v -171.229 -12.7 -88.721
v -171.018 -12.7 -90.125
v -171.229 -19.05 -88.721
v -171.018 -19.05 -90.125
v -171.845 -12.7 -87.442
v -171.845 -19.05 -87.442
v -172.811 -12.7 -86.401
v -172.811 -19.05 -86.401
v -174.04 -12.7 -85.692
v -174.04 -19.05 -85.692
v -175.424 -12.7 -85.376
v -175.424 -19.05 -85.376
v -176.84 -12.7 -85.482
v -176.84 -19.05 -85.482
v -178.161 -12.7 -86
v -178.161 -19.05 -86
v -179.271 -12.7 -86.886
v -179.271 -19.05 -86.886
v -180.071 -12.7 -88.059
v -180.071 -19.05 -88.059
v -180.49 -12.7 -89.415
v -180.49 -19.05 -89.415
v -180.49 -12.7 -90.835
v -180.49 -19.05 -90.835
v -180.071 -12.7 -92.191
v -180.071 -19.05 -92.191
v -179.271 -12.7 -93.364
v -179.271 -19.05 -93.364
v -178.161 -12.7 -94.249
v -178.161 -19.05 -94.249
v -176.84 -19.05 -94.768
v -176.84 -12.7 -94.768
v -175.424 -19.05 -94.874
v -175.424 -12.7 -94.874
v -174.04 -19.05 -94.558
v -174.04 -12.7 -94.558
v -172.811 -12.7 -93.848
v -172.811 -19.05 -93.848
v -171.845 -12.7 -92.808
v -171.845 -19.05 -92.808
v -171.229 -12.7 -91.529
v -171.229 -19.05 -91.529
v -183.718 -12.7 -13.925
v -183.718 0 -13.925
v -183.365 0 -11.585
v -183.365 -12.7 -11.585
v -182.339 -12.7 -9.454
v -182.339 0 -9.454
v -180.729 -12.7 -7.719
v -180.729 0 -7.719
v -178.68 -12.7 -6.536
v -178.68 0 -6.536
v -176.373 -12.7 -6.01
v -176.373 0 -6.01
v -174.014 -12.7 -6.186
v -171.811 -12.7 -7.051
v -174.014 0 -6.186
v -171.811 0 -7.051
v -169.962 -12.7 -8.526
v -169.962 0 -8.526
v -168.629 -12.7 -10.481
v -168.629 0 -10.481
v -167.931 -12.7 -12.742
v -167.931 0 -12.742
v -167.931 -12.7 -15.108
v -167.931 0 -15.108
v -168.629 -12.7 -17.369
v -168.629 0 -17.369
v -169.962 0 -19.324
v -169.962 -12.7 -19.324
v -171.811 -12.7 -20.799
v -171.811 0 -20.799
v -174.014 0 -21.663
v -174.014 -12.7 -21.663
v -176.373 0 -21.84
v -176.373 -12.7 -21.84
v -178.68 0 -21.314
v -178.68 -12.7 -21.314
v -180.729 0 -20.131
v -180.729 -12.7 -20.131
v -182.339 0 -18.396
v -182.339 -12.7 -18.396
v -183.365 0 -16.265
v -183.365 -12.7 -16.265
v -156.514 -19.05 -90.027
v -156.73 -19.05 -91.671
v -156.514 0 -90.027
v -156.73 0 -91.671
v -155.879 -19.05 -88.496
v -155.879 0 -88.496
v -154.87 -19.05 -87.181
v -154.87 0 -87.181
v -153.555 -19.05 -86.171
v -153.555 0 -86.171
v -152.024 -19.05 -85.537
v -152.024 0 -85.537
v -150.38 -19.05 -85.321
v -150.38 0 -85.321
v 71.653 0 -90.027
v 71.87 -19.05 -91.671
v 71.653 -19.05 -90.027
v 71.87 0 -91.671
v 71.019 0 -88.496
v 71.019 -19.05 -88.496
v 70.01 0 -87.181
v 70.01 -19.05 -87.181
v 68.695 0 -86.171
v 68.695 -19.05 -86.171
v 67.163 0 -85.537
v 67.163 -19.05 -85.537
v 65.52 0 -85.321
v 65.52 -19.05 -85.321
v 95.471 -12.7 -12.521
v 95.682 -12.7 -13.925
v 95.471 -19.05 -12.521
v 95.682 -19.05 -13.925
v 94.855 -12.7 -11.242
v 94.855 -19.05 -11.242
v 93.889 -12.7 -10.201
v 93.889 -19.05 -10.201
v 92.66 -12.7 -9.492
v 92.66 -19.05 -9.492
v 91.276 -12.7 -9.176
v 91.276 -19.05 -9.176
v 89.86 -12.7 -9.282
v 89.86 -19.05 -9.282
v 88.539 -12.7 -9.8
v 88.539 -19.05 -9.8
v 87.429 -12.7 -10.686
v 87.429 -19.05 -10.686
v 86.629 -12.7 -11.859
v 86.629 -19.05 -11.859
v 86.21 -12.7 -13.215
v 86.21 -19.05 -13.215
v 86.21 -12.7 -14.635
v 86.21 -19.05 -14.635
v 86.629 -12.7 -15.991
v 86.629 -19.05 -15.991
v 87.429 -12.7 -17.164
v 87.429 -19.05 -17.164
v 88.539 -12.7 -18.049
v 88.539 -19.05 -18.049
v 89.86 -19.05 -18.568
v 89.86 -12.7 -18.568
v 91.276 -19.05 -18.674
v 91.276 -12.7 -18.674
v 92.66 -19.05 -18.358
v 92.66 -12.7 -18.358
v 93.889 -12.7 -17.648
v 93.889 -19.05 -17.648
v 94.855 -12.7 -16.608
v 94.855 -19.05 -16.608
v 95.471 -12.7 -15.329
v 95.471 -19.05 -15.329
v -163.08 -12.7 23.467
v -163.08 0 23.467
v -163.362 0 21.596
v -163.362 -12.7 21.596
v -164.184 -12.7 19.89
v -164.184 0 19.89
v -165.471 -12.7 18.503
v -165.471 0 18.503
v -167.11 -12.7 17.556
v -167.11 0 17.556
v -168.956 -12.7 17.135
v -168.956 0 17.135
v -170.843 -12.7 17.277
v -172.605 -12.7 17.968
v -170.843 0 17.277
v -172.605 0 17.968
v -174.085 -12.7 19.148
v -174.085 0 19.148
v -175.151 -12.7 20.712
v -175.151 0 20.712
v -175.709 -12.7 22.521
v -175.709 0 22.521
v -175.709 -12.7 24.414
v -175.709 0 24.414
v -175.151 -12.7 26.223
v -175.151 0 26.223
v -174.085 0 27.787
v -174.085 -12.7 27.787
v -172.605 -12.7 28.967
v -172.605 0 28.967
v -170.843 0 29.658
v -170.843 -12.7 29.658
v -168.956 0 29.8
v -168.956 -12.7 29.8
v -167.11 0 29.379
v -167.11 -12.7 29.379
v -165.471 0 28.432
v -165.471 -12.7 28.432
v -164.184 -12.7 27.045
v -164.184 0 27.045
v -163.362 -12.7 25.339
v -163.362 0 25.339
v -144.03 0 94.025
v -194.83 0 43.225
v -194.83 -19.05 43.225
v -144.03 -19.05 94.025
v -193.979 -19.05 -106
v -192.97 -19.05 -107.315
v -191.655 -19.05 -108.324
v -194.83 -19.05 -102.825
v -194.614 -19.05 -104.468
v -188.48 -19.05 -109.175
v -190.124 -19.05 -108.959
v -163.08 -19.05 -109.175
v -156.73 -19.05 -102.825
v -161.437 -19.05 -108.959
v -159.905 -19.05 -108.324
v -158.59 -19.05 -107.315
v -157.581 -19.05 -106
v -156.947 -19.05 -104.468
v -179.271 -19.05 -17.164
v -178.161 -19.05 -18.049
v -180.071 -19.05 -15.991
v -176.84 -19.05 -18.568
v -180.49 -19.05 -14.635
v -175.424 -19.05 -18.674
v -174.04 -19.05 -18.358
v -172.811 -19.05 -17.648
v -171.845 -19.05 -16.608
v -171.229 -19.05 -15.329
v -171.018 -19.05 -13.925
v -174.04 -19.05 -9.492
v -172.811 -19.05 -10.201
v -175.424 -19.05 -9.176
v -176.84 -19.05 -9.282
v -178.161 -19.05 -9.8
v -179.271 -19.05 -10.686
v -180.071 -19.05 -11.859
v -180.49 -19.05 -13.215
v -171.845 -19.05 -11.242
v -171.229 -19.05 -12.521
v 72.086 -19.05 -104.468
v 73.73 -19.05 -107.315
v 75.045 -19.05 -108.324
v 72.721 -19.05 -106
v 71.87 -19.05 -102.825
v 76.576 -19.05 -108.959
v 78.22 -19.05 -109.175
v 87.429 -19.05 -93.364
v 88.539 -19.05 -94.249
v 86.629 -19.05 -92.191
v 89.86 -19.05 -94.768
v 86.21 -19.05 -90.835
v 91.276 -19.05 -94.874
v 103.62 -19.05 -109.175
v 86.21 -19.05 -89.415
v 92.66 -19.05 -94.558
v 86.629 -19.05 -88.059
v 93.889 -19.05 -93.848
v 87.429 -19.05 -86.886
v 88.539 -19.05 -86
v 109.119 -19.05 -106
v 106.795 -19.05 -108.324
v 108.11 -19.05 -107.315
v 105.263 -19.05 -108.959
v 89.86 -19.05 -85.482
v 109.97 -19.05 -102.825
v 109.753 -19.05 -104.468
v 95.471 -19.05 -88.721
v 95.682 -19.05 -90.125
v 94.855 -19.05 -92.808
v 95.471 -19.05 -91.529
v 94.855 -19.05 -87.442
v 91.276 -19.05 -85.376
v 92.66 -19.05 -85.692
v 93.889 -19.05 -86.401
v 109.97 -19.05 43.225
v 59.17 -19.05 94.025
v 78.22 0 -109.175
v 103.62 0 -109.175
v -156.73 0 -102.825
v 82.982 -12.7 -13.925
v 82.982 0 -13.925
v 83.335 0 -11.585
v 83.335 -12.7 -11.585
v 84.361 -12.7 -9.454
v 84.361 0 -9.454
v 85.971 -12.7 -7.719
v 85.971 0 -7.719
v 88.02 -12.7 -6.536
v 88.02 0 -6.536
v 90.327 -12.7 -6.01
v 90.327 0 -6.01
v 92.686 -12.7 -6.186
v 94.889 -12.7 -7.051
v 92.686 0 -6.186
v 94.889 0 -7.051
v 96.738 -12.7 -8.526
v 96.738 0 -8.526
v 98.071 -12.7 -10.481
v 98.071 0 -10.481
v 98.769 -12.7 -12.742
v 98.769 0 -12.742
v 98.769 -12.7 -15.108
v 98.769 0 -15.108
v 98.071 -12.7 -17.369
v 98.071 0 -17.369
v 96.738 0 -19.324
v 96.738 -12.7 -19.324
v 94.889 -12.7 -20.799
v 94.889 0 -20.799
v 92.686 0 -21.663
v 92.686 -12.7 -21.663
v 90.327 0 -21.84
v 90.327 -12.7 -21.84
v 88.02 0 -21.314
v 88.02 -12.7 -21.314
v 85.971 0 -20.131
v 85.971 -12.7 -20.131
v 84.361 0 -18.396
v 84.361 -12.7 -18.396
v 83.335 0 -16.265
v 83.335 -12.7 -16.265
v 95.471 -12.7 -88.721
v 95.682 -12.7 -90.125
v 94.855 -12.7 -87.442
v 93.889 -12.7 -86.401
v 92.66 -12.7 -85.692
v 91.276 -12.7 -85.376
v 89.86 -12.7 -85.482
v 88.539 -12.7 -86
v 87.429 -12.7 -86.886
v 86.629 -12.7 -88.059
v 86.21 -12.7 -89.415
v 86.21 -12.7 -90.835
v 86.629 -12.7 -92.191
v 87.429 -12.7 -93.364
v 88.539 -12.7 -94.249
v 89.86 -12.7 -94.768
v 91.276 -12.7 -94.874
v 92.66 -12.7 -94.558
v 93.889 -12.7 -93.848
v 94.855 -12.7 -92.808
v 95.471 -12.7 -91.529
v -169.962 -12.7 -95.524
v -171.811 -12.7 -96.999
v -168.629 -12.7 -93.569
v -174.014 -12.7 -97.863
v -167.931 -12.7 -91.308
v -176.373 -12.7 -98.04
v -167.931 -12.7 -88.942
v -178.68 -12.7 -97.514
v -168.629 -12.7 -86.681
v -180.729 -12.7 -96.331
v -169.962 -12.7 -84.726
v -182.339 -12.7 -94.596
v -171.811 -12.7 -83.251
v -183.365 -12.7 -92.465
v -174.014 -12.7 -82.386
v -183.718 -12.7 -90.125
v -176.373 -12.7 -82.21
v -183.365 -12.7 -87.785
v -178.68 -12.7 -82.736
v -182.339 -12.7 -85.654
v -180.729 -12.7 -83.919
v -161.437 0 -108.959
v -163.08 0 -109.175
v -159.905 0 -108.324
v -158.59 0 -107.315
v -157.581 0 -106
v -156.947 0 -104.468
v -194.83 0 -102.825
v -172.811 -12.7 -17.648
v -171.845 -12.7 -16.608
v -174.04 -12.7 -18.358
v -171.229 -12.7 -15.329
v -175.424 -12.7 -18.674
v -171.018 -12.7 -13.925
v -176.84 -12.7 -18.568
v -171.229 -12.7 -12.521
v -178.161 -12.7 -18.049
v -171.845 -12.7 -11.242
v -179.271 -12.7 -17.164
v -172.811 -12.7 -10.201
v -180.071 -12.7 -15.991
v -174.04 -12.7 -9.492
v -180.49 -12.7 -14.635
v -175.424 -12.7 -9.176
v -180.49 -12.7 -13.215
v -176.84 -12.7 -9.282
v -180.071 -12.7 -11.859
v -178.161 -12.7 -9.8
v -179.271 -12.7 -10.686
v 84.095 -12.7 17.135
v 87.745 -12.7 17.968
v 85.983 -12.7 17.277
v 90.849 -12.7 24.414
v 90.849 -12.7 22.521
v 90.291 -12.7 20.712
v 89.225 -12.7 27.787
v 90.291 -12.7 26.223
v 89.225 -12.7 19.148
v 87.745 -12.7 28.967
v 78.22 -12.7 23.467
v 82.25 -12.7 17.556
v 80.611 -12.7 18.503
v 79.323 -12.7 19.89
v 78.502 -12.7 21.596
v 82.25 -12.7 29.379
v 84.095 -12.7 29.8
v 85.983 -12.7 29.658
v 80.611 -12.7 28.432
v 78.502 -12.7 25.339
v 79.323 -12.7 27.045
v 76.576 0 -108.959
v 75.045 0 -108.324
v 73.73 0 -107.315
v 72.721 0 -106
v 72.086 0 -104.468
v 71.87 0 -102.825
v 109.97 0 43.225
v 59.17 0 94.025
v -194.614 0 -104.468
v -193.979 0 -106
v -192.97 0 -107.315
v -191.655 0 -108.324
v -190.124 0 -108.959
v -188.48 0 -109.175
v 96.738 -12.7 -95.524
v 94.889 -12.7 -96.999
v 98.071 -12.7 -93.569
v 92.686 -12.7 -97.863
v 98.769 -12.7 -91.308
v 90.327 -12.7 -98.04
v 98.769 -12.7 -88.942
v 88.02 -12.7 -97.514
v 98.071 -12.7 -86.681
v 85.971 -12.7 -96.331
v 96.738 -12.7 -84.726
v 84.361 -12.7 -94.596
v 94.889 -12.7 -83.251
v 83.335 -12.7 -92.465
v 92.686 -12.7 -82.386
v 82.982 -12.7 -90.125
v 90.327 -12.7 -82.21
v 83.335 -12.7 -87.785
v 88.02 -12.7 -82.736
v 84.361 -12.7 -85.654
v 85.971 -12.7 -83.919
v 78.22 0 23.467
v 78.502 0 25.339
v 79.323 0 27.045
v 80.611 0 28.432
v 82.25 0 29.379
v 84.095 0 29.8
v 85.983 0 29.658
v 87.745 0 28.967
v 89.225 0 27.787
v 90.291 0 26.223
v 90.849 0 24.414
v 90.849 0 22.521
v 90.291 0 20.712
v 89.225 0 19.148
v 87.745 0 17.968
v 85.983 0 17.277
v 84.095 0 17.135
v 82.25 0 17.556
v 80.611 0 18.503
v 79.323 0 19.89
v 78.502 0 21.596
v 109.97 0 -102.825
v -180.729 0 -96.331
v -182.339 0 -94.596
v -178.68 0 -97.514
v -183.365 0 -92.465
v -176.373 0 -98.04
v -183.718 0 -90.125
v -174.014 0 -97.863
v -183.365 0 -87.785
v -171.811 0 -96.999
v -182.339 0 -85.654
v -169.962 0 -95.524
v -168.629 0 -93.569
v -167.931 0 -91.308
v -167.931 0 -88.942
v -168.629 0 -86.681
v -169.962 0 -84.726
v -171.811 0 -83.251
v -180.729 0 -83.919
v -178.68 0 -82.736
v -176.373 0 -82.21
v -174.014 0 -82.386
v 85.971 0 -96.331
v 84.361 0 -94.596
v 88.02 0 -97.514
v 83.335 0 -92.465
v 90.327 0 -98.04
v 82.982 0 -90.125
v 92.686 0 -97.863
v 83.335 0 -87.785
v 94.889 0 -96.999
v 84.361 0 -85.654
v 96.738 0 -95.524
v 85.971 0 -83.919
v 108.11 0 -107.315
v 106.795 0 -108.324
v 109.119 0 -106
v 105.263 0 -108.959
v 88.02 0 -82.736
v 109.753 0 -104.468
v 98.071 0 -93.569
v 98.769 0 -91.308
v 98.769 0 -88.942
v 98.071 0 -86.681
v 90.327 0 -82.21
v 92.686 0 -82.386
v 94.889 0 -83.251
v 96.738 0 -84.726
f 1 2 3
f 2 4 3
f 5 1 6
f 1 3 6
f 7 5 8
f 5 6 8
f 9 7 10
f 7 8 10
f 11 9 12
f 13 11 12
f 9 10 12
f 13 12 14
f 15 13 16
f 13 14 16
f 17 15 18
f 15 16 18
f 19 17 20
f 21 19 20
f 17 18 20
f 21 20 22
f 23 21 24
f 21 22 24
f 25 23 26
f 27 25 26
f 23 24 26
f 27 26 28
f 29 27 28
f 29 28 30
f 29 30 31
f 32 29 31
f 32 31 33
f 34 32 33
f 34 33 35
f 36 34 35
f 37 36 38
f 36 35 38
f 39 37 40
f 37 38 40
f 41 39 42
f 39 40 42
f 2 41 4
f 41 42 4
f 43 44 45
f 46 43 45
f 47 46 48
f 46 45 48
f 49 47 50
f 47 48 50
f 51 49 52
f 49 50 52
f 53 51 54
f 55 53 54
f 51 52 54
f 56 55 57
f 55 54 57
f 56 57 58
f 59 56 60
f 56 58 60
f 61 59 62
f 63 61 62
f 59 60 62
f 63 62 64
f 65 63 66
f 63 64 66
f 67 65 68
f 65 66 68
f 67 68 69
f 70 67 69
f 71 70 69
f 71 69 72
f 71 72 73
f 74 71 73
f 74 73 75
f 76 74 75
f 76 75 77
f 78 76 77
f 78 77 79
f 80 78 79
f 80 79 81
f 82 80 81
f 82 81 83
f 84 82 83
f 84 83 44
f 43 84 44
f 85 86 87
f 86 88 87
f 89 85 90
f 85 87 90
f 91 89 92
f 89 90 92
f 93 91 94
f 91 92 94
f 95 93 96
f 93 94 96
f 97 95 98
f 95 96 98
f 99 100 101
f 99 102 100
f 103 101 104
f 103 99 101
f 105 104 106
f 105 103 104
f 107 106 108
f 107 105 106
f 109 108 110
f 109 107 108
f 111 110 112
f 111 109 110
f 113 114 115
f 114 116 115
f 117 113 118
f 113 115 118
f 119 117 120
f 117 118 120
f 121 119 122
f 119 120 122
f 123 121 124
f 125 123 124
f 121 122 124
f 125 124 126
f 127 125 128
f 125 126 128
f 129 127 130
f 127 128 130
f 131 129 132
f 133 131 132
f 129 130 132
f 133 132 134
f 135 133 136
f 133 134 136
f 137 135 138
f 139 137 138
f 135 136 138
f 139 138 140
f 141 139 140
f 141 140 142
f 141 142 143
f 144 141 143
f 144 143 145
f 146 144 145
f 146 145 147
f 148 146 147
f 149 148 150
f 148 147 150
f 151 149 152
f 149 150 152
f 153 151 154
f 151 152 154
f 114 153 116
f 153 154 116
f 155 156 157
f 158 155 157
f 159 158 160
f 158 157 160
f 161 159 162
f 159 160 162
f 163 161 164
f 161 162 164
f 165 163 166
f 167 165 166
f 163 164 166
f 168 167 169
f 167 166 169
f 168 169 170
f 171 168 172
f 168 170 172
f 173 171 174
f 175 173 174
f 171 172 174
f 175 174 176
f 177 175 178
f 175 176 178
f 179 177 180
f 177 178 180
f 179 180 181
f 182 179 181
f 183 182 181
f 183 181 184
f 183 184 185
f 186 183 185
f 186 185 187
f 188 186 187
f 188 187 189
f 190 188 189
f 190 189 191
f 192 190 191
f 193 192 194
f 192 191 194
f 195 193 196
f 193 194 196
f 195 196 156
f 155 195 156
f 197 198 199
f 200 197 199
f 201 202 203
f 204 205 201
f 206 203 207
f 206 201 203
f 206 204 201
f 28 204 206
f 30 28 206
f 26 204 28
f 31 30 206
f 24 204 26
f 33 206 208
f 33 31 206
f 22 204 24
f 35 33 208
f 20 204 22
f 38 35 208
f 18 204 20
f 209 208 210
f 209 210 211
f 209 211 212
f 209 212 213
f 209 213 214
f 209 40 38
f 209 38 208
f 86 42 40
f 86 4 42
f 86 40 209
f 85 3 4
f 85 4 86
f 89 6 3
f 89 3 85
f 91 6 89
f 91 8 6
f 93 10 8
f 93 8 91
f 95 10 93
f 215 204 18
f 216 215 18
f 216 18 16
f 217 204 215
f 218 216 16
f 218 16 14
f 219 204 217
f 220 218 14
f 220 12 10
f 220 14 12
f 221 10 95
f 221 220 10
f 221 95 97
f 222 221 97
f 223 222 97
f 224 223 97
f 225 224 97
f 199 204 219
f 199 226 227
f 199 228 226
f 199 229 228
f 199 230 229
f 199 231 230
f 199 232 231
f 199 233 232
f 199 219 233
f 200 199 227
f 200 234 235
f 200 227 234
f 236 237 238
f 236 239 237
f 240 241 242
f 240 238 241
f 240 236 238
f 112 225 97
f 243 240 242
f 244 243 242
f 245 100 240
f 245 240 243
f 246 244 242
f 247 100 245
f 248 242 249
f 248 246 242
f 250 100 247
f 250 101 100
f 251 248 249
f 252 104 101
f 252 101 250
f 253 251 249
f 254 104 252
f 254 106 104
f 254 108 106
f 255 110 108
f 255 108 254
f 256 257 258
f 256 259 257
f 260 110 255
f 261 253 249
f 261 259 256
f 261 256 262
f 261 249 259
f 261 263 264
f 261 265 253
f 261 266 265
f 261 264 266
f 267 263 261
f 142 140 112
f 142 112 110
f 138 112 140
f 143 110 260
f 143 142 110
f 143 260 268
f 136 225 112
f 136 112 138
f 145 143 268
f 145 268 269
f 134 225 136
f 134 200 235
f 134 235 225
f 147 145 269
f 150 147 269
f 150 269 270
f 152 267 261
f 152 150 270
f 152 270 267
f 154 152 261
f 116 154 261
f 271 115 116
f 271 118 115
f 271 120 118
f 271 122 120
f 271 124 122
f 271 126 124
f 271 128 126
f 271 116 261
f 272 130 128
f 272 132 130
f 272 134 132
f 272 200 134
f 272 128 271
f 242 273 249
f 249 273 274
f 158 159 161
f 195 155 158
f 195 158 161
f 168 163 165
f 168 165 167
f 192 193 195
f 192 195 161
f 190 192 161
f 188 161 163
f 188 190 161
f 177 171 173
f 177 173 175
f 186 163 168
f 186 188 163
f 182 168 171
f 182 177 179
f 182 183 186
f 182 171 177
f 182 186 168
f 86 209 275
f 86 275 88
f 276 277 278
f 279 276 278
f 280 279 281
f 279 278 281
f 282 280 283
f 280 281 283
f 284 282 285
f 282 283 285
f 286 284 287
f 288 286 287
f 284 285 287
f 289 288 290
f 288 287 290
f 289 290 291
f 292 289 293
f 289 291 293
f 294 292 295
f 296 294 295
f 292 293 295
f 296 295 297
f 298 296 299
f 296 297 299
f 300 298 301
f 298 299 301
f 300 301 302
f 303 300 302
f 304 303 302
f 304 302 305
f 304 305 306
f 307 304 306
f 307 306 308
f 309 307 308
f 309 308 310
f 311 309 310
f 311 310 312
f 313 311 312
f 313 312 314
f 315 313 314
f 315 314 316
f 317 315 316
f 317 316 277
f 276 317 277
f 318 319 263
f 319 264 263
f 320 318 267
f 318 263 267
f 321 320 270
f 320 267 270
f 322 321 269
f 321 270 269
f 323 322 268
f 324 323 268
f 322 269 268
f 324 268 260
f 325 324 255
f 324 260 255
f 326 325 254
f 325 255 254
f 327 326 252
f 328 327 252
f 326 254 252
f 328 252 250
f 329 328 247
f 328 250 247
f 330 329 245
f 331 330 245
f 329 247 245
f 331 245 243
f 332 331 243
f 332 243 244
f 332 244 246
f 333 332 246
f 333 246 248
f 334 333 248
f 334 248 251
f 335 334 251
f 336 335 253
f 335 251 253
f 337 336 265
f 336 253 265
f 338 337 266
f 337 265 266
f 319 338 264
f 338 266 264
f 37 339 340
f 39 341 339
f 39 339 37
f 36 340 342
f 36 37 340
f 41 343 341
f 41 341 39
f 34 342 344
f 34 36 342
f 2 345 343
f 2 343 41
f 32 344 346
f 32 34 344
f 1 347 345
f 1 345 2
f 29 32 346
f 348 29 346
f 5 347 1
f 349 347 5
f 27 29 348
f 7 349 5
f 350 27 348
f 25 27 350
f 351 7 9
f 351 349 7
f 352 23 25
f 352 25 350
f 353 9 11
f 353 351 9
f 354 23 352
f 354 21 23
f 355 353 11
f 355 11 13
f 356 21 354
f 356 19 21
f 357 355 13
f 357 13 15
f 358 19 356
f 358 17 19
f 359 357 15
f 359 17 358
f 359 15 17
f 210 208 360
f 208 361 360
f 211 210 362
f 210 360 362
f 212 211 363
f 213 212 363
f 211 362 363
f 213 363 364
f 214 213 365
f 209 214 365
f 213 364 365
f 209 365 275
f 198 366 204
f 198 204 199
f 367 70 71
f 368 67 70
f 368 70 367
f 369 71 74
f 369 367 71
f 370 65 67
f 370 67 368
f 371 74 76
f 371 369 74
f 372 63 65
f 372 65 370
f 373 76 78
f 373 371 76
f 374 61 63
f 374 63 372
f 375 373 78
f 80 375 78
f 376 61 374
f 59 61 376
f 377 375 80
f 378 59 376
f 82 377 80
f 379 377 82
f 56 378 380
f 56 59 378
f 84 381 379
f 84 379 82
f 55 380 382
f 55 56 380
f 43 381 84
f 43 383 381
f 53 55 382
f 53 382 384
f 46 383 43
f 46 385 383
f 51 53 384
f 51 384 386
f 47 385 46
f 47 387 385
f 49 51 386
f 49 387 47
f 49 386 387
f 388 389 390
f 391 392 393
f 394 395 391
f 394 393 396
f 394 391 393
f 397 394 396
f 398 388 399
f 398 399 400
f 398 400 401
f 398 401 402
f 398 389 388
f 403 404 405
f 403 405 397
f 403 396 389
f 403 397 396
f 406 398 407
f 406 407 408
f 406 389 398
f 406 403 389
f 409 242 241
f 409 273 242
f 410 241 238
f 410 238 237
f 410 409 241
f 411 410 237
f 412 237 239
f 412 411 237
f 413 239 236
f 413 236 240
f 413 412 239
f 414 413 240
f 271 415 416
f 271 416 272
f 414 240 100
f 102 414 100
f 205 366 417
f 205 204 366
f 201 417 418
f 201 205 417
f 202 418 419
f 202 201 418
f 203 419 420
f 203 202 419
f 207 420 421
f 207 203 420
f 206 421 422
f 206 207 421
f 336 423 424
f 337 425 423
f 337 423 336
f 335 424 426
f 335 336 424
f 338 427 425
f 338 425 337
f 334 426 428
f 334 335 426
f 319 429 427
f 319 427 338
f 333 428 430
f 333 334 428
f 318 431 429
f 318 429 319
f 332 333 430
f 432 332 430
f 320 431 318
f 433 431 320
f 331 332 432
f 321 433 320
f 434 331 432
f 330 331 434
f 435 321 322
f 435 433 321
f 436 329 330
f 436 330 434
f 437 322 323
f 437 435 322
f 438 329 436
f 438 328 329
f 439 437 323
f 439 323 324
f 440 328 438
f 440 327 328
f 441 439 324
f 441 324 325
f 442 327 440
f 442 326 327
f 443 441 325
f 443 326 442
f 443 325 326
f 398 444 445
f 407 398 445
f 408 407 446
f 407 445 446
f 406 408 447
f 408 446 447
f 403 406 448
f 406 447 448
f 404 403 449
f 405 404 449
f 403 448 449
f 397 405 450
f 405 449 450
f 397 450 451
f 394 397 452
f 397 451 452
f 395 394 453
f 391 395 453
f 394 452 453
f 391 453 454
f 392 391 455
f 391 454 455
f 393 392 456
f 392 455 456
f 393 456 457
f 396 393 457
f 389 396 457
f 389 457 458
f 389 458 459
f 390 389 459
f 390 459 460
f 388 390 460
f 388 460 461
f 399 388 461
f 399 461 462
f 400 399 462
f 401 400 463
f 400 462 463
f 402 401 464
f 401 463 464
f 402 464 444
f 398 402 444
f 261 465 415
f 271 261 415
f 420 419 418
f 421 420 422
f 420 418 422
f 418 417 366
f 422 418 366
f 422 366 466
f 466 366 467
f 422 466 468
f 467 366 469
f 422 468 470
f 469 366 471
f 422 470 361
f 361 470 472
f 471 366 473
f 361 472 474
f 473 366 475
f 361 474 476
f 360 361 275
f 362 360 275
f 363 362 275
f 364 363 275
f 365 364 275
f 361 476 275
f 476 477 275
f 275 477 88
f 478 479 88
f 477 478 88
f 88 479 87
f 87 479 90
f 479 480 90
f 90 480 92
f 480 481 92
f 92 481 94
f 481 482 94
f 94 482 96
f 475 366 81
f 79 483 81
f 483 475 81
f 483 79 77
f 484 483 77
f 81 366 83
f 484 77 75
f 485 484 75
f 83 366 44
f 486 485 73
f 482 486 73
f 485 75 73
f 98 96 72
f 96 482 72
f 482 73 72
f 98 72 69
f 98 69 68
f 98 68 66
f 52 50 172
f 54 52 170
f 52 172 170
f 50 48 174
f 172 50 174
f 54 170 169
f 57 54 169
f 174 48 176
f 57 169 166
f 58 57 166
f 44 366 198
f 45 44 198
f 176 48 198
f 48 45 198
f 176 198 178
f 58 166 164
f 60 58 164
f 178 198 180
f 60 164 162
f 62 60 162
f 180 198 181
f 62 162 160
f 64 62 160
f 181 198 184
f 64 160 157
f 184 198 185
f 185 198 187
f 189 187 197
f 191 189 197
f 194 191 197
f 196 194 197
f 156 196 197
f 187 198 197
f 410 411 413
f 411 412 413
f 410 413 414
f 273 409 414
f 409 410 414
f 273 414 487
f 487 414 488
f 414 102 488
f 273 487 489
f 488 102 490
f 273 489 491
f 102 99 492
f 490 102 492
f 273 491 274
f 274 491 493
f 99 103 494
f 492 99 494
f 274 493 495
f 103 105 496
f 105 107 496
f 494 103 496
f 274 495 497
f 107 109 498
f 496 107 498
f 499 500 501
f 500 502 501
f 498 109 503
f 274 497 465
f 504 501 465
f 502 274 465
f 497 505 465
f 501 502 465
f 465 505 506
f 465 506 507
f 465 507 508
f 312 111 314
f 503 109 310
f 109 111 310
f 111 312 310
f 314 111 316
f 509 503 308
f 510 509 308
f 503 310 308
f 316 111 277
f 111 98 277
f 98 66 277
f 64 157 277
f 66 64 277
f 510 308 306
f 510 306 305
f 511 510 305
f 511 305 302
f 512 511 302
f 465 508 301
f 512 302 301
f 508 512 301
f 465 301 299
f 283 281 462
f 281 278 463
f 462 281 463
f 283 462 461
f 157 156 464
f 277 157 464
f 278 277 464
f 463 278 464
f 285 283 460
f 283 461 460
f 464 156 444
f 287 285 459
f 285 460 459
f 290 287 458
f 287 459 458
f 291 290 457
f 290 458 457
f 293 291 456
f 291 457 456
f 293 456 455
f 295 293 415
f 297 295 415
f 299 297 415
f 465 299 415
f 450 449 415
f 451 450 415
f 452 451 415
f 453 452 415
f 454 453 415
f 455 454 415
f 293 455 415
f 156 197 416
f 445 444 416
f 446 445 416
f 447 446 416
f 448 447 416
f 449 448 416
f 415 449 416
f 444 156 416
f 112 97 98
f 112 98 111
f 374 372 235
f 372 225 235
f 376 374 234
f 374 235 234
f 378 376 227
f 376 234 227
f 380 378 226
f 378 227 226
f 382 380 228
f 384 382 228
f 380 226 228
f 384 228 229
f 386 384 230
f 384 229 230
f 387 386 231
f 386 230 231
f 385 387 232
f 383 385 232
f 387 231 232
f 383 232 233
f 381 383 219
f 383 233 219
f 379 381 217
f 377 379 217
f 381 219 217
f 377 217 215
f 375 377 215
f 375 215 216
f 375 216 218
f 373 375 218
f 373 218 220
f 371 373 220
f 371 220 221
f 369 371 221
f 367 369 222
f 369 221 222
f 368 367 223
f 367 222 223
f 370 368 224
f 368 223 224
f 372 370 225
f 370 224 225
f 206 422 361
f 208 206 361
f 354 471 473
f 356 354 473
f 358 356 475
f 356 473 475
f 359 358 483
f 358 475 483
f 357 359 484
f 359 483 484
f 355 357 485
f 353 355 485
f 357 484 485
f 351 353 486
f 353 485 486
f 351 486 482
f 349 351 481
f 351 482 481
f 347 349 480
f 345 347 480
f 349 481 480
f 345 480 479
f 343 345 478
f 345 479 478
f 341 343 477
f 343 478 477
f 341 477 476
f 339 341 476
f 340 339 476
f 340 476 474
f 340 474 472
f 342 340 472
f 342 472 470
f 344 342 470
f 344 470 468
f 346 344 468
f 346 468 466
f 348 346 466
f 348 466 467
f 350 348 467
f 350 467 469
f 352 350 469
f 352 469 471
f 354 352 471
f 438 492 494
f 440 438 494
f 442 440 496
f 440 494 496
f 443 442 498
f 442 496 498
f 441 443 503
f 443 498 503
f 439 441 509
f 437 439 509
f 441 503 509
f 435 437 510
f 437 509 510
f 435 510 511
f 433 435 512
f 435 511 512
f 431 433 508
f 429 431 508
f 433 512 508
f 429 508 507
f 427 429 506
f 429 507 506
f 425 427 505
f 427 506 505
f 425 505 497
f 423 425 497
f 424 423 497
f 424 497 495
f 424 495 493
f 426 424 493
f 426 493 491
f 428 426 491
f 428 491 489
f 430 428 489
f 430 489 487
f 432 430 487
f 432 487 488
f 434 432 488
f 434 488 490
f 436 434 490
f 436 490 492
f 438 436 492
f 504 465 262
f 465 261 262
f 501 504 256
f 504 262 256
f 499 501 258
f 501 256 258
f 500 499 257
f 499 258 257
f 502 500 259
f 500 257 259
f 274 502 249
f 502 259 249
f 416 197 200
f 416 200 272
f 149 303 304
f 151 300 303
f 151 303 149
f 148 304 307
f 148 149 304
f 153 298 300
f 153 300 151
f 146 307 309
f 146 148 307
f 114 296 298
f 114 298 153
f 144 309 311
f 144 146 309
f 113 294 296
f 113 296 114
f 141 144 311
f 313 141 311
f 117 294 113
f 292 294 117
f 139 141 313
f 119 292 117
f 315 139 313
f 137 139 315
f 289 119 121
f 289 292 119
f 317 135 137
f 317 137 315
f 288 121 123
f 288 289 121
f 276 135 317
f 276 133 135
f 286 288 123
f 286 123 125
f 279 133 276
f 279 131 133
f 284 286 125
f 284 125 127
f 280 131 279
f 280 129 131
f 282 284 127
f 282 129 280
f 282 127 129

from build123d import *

# Parameters (mm, degrees)
F0_W           = 304.8
F0_H           = 203.2
F1_DEPTH       = 19.05
F2_W           = 228.6
F2_H           = 23.8541702911
F3_DEPTH       = 19.051
F4_R           = 6.35
F5_R           = 6.35
F6_DEPTH       = 12.7
F8_D           = 9.525
F8_CBORE_D     = 15.875
F8_CBORE_DEPTH = 12.7
F9_SIZE        = 50.8


with BuildPart() as f1:
    # F0 (on Front) → F1 (new body)
    with BuildSketch(Plane.XZ):
        with Locations((-42.4302353088, -7.5749112293)):
            Rectangle(F0_W, F0_H)
    extrude(amount=F1_DEPTH)

    # F2 (on face) → F3 (cut, through all)
    with BuildSketch(Plane.XZ.offset(19.05)):
        with Locations((-42.4302353088, -97.2478260837)):
            Rectangle(F2_W, F2_H)
    extrude(amount=-F3_DEPTH, mode=Mode.SUBTRACT)

    # F4
    f4_edges = [f1.edges().sort_by_distance(p)[0] for p in [
        (-156.730235, -9.525, -85.320741),
        (-156.730235, -9.525, -109.174911),
        (-194.830235, -9.525, -109.174911),
        (71.869765, -9.525, -85.320741),
        (71.869765, -9.525, -109.174911),
        (109.969765, -9.525, -109.174911),
    ]]
    fillet(f4_edges, radius=F4_R)

    # F5 (on face) → F6 (cut)
    with BuildSketch(Plane(origin=(0, 0, 0), x_dir=(-1, 0, 0), z_dir=(0, 1, 0))):
        with Locations((-84.5697646912, 23.4674590618)):
            Circle(F5_R)
        with BuildLine():
            ThreePointArc((175.7802353088, 23.4674590618), (169.4302353088, 29.8174590618), (163.0802353088, 23.4674590618))
            ThreePointArc((163.0802353088, 23.4674590618), (169.4302353088, 17.1174590618), (175.7802353088, 23.4674590618))
        make_face()
    extrude(amount=-F6_DEPTH, mode=Mode.SUBTRACT)

    # F8 (through all)
    with Locations(Plane(origin=(0, 0, 0), x_dir=(-1, 0, 0), z_dir=(0, 1, 0))):
        with Locations((-90.9197646912, -13.9249112293), (-90.9197646912, -90.1249112293), (175.7802353088, -90.1249112293), (175.7802353088, -13.9249112293)):
            CounterBoreHole(F8_D / 2, F8_CBORE_D / 2, F8_CBORE_DEPTH)

    # F9
    f9_edges = [f1.edges().sort_by_distance(p)[0] for p in [
        (109.969765, -9.525, 94.025089),
        (-194.830235, -9.525, 94.025089),
    ]]
    chamfer(f9_edges, length=F9_SIZE)


solid = f1.part
